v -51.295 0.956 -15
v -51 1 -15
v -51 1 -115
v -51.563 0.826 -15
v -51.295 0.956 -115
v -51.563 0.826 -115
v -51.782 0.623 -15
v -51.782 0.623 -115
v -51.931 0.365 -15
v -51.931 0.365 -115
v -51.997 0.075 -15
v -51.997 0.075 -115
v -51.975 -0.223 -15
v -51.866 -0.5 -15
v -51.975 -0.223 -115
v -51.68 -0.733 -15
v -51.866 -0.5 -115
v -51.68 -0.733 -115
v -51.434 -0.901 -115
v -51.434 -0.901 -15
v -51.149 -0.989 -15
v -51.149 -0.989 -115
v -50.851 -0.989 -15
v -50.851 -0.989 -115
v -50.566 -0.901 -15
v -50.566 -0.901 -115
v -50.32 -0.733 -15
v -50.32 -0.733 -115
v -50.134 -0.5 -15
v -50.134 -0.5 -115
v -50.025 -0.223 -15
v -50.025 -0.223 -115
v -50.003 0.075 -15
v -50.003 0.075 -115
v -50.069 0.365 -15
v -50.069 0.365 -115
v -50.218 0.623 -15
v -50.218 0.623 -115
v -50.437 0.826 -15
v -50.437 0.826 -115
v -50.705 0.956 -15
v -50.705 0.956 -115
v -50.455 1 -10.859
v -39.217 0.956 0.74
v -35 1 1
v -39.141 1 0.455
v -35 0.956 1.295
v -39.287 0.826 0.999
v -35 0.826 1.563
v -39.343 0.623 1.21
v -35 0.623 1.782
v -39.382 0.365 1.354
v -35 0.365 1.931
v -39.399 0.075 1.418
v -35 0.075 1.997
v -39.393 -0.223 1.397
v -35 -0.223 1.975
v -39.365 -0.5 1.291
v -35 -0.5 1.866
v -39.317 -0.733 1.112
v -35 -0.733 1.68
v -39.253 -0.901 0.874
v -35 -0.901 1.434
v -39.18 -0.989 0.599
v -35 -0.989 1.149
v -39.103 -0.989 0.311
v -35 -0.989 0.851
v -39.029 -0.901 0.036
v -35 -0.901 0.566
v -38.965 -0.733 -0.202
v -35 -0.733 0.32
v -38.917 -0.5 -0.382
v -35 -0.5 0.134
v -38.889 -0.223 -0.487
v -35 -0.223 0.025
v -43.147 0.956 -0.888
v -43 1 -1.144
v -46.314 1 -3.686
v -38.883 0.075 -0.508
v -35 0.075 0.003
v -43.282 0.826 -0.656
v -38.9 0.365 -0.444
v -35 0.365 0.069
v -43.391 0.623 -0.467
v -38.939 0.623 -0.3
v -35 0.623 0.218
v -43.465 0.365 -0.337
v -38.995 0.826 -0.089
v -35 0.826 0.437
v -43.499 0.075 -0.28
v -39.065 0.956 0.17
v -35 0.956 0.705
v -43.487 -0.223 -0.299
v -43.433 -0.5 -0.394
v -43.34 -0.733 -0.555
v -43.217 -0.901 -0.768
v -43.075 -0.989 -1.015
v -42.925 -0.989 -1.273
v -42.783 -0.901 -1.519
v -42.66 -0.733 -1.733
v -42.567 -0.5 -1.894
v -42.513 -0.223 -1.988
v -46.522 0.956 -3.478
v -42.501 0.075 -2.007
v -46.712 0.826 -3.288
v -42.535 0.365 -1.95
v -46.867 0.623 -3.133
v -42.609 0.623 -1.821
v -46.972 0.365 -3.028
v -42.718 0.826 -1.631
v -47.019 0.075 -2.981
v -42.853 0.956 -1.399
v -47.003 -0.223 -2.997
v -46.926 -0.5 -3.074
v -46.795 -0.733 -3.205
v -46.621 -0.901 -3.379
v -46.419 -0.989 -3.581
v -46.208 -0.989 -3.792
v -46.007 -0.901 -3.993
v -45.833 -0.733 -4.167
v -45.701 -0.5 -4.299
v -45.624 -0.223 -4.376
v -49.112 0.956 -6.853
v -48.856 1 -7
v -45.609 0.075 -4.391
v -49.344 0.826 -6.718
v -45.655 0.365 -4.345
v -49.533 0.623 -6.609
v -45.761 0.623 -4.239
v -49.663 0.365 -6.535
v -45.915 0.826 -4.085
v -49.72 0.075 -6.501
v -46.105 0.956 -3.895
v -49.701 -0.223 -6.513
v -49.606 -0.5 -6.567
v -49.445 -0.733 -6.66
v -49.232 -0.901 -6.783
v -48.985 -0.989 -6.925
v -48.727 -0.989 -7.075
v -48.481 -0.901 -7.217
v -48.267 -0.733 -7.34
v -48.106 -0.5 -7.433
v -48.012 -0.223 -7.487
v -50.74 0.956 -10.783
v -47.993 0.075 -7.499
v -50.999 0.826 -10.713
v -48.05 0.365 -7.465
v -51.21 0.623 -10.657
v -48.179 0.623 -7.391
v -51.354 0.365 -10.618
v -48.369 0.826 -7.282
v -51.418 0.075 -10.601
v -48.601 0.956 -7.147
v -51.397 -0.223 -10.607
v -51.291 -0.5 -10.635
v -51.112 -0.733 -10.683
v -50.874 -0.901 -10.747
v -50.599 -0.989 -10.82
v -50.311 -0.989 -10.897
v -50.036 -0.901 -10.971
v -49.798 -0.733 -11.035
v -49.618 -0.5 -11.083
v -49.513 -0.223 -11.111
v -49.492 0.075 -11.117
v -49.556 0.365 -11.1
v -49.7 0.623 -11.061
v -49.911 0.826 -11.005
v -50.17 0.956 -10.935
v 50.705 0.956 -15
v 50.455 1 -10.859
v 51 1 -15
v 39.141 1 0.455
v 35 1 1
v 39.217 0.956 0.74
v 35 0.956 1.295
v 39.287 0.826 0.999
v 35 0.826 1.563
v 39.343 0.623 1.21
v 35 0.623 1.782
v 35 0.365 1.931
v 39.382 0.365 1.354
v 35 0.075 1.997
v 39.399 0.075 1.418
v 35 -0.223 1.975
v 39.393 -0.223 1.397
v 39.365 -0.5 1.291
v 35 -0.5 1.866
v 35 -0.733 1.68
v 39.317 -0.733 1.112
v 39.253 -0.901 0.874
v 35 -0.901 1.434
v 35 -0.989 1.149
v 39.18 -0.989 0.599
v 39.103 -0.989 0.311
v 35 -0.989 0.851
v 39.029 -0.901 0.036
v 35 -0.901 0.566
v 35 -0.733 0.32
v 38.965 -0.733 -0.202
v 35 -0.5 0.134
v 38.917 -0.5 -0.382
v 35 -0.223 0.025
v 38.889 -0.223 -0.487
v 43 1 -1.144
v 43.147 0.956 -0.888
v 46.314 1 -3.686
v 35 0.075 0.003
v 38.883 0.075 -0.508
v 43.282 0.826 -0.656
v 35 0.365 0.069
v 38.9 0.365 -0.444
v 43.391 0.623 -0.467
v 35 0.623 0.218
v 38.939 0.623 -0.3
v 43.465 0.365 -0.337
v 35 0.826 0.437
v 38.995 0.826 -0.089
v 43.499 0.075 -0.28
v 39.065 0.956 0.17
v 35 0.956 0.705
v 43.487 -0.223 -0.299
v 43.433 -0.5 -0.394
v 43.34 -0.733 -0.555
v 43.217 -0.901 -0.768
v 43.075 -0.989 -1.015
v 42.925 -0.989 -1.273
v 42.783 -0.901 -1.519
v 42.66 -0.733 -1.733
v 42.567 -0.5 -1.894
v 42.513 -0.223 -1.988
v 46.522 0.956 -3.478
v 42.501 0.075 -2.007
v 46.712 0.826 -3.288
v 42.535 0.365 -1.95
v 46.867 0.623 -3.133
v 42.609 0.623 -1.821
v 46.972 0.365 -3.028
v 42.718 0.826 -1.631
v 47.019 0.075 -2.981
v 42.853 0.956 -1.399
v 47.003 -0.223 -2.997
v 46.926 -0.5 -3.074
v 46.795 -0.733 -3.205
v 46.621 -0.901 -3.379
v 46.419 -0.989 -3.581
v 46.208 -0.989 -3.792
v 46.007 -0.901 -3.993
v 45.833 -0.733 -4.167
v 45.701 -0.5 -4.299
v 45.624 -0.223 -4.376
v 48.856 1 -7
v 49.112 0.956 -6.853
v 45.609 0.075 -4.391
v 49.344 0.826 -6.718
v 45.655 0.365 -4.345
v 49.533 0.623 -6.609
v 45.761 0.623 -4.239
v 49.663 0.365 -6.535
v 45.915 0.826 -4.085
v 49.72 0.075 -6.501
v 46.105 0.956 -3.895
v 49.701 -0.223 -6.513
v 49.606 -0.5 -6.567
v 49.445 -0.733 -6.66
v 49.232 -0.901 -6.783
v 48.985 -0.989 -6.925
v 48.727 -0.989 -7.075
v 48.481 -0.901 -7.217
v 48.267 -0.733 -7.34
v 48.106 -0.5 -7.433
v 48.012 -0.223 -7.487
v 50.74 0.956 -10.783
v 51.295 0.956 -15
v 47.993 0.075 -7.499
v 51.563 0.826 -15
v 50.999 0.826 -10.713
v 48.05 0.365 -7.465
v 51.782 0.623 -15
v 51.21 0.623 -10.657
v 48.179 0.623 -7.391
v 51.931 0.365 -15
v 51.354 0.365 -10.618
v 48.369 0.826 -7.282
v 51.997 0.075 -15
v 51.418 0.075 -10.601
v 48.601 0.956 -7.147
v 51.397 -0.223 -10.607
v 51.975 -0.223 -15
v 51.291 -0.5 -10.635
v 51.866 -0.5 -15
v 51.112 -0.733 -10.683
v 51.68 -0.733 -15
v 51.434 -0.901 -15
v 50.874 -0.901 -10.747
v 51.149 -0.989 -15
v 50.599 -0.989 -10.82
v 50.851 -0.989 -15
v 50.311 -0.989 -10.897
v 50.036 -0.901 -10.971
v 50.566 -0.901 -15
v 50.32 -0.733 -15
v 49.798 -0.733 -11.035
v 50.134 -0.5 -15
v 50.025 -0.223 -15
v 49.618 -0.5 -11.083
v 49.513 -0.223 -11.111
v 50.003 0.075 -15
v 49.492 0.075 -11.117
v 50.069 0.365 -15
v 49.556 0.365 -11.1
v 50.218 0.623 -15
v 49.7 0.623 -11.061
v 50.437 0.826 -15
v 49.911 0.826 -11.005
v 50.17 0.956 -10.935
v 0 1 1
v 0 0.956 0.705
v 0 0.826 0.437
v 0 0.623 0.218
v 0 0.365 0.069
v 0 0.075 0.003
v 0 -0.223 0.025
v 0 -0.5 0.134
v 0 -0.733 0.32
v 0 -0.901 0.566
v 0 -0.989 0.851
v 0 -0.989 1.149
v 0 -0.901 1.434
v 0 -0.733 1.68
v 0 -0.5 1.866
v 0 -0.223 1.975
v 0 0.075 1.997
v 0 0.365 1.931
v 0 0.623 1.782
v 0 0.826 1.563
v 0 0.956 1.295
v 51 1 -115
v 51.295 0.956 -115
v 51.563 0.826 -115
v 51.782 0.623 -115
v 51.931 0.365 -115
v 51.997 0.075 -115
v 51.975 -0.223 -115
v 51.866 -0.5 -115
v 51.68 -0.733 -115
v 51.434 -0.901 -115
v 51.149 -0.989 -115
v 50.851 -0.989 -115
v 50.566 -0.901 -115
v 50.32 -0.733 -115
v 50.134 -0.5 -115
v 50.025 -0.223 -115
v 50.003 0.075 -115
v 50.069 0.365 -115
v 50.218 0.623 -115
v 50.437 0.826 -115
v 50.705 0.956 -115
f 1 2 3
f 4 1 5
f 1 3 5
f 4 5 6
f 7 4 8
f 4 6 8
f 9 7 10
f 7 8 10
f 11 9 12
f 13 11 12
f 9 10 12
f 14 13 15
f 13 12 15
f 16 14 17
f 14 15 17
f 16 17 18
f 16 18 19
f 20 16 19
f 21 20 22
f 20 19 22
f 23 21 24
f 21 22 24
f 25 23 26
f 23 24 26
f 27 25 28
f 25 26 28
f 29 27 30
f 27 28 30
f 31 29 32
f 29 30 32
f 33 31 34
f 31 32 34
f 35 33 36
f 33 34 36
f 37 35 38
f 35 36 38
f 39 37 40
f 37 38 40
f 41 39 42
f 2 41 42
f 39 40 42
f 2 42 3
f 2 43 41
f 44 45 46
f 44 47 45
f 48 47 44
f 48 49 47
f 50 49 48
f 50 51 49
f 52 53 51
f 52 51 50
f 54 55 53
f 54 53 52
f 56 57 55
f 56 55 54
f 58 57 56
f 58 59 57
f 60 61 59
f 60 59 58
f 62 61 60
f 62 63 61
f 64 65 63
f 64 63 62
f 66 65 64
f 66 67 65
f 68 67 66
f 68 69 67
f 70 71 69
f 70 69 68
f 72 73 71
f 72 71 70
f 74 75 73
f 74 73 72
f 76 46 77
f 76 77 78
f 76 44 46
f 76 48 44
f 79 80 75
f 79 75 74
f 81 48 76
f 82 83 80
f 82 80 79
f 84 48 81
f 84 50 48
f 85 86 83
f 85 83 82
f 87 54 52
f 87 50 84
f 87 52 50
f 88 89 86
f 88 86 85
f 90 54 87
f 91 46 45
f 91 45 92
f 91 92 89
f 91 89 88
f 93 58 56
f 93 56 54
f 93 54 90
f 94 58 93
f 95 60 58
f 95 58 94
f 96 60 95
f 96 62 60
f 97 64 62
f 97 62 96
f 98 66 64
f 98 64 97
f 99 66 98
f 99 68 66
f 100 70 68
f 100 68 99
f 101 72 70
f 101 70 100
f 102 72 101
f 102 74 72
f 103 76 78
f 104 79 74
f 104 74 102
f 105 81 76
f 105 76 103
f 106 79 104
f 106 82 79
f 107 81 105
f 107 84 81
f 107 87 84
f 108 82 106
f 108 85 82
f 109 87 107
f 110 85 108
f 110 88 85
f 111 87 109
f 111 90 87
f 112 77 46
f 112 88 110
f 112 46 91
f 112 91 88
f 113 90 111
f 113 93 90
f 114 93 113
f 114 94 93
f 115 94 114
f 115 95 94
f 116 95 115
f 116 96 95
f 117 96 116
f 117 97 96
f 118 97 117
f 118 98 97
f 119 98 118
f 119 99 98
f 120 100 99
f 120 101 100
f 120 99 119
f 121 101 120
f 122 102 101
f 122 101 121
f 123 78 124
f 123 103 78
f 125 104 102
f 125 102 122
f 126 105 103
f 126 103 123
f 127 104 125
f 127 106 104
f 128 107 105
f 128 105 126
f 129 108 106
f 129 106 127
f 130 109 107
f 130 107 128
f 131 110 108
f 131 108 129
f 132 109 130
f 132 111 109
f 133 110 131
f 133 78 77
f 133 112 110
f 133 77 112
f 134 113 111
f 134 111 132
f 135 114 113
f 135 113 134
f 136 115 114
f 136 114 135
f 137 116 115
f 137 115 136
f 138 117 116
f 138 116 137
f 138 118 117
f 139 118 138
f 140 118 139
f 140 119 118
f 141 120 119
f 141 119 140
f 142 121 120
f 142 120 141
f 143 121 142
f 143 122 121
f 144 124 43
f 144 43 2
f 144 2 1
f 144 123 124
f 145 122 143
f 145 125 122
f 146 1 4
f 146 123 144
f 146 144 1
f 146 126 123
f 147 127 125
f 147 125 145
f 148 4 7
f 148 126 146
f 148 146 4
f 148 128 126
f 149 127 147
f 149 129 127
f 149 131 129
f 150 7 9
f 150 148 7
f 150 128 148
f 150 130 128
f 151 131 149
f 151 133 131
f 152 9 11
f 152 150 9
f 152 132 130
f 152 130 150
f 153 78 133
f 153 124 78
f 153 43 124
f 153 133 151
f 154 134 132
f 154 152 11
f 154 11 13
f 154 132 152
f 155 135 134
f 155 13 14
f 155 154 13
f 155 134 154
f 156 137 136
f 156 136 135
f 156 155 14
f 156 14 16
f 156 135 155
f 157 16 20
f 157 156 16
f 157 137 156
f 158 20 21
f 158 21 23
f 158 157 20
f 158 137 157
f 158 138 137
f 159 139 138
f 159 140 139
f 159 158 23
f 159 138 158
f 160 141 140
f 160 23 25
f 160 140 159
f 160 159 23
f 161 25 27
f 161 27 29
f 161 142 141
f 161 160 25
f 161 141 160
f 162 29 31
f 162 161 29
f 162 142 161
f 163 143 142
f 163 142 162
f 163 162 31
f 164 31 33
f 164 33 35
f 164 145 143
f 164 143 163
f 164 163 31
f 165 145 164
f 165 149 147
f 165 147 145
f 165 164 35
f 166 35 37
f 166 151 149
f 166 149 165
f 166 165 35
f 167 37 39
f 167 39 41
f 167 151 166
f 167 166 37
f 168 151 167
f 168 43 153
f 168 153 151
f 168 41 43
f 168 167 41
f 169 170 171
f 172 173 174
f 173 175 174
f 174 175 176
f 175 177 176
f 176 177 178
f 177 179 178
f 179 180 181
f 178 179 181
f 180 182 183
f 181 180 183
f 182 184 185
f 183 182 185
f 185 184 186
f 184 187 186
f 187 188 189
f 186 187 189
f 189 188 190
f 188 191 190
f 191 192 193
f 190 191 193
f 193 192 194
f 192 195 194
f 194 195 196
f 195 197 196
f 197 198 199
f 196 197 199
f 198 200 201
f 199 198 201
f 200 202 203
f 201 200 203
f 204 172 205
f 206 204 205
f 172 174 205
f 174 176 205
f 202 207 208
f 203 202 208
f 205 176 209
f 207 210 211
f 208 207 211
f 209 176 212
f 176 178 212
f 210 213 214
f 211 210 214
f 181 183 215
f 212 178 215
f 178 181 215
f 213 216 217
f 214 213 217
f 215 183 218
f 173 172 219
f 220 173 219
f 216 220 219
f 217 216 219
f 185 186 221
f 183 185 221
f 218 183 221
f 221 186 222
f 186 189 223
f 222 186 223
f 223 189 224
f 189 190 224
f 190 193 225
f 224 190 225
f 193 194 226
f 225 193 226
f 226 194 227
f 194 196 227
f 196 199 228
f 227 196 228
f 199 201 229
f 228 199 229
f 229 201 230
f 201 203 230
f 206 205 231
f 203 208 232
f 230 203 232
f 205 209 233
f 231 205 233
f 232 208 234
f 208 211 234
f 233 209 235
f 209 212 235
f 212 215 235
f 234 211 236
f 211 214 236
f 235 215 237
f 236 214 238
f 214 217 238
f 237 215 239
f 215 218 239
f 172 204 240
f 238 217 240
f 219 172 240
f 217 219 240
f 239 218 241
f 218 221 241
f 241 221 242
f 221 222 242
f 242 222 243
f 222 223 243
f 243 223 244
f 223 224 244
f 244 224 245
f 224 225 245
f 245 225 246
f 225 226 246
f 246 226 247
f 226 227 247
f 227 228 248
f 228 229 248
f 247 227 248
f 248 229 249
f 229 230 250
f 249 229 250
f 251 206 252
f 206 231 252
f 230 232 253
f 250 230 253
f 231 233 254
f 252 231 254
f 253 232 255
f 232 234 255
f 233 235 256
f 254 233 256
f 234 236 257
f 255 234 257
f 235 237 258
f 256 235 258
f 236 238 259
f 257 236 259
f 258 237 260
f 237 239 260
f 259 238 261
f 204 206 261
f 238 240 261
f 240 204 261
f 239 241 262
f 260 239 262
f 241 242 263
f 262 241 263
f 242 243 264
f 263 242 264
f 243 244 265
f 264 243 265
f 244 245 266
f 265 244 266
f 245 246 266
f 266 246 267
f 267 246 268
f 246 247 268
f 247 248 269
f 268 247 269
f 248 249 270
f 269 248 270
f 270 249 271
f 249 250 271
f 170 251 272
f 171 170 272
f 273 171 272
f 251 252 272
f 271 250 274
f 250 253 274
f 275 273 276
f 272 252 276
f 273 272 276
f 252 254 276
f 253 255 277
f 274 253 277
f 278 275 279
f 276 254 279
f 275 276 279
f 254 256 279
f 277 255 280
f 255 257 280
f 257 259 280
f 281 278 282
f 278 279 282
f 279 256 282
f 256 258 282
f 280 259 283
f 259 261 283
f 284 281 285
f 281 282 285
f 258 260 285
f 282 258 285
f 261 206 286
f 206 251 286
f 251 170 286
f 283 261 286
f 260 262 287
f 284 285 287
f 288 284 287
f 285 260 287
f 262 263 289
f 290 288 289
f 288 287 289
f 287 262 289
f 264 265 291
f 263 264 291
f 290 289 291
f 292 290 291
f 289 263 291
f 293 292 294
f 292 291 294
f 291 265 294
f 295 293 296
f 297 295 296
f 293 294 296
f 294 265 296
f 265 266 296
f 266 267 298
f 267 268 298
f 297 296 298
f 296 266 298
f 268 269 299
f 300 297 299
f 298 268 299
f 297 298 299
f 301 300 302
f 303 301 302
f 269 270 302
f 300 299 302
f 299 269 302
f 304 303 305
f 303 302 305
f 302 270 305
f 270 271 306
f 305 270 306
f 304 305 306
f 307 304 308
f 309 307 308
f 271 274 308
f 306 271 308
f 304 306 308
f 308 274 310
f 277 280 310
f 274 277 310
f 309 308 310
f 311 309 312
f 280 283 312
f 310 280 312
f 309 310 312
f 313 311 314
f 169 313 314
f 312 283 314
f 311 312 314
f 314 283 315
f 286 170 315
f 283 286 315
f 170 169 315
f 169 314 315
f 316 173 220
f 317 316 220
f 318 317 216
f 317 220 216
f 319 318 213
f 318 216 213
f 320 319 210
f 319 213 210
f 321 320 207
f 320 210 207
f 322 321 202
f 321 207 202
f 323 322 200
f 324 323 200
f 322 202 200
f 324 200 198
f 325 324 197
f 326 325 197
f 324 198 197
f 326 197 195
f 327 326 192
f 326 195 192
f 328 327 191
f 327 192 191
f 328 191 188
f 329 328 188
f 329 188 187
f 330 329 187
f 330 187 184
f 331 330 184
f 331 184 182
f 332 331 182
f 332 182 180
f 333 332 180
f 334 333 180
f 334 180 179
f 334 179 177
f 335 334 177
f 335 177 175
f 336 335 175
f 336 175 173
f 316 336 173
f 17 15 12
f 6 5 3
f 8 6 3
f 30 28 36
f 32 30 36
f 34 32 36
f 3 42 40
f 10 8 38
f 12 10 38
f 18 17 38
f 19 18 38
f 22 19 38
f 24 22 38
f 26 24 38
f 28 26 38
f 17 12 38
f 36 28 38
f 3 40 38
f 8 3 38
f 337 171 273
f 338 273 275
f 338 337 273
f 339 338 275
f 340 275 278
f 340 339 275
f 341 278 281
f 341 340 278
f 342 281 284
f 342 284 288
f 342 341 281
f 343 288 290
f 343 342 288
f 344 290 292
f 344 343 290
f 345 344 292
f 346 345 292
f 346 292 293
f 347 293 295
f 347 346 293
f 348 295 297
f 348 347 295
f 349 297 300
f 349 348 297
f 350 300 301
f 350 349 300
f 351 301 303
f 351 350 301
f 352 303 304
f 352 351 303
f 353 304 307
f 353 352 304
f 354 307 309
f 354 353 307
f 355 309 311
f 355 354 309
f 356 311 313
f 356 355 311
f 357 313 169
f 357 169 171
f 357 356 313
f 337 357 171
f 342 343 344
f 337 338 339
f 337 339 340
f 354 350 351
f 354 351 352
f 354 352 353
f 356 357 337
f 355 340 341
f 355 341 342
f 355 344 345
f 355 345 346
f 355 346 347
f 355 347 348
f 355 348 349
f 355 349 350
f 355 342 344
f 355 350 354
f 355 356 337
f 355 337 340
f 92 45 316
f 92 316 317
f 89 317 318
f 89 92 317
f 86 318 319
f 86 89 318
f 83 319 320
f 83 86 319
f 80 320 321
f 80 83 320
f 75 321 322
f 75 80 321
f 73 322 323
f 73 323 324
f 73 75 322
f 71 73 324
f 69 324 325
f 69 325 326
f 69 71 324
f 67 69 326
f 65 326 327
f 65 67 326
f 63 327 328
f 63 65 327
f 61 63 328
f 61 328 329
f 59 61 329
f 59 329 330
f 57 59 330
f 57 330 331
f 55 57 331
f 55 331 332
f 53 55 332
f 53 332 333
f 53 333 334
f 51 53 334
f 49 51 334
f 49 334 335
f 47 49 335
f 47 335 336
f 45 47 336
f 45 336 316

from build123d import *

# Parameters (mm, degrees)
F1_R = 1


with BuildPart() as f2:
    # F2: sweep along a path in F0
    with BuildLine(Plane.XZ) as f2_path:
        Line((0, 0), (-35, 0))
        ThreePointArc((-35, 0), (-45.606602, -4.393398), (-50, -15))
        Line((-50, -15), (-50, -115))
    # F1 (on Right) → F2 (sweep)
    with BuildSketch(Plane.YZ):
        with Locations((0, 1)):
            Circle(F1_R)
    sweep(path=f2_path.line)

    # F3: F2 across plane


with BuildPart() as f2_1:
    add(f2.part)
    add(f2.part.mirror(Plane.YZ))


solid = f2_1.part
